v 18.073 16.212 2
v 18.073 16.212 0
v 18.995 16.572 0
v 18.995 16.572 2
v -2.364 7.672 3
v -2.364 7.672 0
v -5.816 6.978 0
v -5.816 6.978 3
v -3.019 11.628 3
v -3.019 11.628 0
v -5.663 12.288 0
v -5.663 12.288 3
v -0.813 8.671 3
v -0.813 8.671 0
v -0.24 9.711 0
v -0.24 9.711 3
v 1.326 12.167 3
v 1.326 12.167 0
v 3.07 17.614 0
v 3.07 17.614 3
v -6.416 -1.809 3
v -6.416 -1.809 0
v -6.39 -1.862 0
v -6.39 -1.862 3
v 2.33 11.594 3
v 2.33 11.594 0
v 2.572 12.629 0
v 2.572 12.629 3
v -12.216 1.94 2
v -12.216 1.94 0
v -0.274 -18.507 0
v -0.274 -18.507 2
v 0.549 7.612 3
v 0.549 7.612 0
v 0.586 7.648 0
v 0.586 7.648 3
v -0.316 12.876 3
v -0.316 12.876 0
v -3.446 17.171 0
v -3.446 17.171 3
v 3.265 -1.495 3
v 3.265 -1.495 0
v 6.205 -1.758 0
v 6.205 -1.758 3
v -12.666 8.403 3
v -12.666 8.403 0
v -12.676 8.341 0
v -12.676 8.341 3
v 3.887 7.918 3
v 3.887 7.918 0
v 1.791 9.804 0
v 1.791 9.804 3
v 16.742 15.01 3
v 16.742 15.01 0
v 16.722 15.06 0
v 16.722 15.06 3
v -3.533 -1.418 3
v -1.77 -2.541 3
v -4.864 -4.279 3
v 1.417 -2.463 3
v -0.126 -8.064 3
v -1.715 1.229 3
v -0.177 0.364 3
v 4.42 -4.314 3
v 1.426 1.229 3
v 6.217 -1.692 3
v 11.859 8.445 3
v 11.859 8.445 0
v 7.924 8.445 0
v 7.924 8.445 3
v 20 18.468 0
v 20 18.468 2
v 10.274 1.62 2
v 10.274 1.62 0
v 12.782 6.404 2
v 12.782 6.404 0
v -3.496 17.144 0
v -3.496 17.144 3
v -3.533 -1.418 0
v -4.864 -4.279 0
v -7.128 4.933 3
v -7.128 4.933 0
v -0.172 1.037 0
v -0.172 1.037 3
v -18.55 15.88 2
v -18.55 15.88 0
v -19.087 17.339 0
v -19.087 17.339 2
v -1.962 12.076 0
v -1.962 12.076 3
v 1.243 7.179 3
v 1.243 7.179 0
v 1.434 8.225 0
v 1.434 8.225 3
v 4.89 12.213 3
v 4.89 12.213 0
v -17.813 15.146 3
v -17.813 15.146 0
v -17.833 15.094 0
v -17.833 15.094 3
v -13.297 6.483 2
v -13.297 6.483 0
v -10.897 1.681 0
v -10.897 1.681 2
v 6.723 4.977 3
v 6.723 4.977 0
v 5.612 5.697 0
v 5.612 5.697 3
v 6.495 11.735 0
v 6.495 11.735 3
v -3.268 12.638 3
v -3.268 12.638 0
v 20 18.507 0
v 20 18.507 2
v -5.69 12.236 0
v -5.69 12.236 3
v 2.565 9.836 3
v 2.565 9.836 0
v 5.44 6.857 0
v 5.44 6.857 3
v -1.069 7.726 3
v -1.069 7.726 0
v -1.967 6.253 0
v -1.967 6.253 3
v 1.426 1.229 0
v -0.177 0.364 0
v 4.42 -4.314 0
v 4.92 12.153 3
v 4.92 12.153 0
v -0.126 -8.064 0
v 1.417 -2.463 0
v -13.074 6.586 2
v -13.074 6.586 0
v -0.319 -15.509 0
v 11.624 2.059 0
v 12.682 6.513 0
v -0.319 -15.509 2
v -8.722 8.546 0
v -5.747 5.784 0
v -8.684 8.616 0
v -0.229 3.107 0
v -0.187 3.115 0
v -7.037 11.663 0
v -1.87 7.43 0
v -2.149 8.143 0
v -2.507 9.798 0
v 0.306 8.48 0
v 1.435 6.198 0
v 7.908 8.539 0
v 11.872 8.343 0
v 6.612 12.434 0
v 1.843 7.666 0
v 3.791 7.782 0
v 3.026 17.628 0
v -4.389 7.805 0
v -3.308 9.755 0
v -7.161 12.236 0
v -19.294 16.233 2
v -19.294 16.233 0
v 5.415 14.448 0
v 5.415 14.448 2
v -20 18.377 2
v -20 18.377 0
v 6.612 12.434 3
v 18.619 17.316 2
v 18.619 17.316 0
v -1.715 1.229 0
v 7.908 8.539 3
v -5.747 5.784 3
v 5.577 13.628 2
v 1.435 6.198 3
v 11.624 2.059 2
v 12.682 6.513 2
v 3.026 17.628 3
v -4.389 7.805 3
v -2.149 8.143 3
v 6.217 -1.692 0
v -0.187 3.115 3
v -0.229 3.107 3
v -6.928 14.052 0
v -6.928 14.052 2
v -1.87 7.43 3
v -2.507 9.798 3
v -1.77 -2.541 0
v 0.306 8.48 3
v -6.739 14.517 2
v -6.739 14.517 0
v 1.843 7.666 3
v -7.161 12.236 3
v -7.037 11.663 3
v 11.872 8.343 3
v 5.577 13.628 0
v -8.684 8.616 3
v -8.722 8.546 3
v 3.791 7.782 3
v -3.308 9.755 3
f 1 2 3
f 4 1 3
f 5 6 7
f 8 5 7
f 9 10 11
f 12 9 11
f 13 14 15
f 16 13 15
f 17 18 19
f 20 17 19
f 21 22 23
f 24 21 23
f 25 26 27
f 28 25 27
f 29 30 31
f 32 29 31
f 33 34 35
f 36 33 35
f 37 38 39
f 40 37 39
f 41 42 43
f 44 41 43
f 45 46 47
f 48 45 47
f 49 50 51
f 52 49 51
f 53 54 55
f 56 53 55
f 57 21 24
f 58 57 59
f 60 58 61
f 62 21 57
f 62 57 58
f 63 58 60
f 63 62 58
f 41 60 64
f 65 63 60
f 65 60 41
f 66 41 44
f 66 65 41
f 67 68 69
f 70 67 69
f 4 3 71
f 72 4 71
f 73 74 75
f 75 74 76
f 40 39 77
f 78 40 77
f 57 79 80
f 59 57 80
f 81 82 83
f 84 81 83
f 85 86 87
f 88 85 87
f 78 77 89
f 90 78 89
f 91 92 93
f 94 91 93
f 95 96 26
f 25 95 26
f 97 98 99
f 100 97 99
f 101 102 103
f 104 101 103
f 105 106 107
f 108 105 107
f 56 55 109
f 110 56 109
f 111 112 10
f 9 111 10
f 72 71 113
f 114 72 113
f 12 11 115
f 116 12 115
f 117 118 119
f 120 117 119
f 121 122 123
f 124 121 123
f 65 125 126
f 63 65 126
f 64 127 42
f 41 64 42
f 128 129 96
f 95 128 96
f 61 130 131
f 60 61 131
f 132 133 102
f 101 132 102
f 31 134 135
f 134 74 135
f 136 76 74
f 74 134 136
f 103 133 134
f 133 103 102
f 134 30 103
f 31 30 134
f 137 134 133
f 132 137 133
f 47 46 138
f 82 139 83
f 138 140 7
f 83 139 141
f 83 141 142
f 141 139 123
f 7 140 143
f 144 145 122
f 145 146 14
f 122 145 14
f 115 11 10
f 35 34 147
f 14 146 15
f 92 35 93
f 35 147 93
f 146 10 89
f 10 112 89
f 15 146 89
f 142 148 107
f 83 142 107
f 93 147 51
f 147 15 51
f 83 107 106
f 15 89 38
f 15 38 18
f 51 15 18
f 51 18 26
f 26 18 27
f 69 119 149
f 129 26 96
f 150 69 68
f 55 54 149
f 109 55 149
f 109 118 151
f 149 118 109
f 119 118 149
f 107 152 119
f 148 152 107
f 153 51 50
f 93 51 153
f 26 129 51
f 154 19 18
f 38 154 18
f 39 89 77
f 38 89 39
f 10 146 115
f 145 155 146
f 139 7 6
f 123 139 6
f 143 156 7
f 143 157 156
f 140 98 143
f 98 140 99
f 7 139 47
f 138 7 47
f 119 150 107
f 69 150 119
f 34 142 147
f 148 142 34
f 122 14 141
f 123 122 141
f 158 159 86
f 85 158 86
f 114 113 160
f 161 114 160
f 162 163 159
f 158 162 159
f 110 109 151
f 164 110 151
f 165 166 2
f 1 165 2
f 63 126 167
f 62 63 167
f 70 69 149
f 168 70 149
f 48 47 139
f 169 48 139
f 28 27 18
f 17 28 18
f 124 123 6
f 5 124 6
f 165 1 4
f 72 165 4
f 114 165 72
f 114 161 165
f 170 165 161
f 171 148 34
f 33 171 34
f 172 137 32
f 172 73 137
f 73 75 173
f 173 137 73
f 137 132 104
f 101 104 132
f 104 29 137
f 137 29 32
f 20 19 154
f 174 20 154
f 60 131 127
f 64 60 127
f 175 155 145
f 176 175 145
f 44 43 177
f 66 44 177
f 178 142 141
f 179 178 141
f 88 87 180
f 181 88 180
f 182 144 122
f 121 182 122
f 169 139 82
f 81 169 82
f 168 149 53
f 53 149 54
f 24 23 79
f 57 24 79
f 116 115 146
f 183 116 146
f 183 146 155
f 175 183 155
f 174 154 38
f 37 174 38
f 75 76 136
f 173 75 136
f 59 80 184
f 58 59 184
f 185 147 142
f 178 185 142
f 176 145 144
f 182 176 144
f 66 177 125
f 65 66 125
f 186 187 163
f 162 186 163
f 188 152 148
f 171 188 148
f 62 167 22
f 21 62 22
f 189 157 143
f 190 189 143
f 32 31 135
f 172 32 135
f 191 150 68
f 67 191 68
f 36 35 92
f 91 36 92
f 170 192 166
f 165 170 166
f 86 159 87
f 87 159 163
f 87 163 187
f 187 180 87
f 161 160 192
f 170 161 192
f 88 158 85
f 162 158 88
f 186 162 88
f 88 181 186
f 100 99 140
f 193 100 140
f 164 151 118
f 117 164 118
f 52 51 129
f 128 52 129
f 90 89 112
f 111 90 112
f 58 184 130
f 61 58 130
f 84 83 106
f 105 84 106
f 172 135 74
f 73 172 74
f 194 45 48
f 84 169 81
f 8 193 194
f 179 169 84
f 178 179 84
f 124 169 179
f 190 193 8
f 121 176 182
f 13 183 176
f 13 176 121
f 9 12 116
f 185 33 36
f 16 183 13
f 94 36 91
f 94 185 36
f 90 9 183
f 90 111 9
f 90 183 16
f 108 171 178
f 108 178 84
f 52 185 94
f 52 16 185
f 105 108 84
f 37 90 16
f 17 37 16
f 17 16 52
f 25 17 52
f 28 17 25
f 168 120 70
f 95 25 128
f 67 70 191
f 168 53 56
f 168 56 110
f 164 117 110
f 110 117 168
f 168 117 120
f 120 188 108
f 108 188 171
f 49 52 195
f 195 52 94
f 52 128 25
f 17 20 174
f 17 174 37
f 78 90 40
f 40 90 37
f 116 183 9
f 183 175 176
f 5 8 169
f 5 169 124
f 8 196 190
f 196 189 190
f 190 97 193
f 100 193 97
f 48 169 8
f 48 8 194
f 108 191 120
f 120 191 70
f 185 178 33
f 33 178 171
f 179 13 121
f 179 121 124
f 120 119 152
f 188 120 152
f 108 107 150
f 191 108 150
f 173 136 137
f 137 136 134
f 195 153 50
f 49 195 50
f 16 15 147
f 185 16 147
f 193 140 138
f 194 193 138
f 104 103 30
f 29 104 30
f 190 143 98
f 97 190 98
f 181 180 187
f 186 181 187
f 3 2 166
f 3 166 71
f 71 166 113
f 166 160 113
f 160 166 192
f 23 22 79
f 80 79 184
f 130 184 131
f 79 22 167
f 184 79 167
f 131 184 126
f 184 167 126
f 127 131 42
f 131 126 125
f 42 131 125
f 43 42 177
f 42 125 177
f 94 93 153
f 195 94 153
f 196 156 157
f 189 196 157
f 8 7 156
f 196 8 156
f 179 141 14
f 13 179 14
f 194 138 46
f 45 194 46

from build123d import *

# Parameters (mm, degrees)
F1_DEPTH = 3
F2_DEPTH = 2


with BuildPart() as f1:
    # F0 (on Top) → F1 (new body)
    with BuildSketch(Plane.XY):
        Polygon((7.907842, 8.538687), (16.74215, 15.010359), (16.721842, 15.059722), (6.494656, 11.734686), (6.611635, 12.434355), (2.565389, 9.835677), (5.439689, 6.85723), (1.842724, 7.665902), (1.434655, 6.197749), (0.549113, 7.611849), (0.586172, 7.647995), (1.242522, 7.178572), (1.434276, 8.224858), (3.791214, 7.782166), (3.887142, 7.918195), (1.790835, 9.804296), (4.920111, 12.153183), (4.889556, 12.213288), (2.330171, 11.593876), (2.572244, 12.628565), (1.326409, 12.166996), (3.07041, 17.613794), (3.025963, 17.628013), (-0.315749, 12.875707), (-3.445606, 17.171227), (-3.495616, 17.144395), (-1.961859, 12.075858), (-3.267673, 12.638358), (-3.019098, 11.627581), (-5.66303, 12.288217), (-5.690025, 12.235915), (-2.506646, 9.797755), (-4.388916, 7.805242), (-2.148981, 8.142507), (-1.86975, 7.429696), (-1.068826, 7.726003), (-1.966873, 6.253454), (-2.363597, 7.671869), (-5.815879, 6.978105), (-3.307755, 9.755126), (-7.16087, 12.236394), (-7.036772, 11.662706), (-17.813078, 15.145552), (-17.832896, 15.093641), (-8.684373, 8.616295), (-8.72197, 8.545996), (-12.66624, 8.40341), (-12.67619, 8.341238), (-5.746909, 5.784377), (-7.127951, 4.932837), (-0.171673, 1.036983), (6.722542, 4.976714), (5.612193, 5.69696), (11.871901, 8.342868), (11.858882, 8.444866), (7.924471, 8.444866), align=None)
        Polygon((-0.186629, 3.115098), (-0.22882, 3.107443), (-0.813041, 8.671457), (-0.240196, 9.711248), (0.306376, 8.479956), align=None, mode=Mode.SUBTRACT)
        Polygon((-4.864236, -4.278623), (-1.769502, -2.540595), (-0.12638, -8.064224), (1.417114, -2.463104), (4.419826, -4.313662), (3.264686, -1.494774), (6.204638, -1.757816), (6.21701, -1.692158), (1.426404, 1.228785), (-0.177398, 0.363535), (-1.714927, 1.228641), (-6.416431, -1.808915), (-6.390156, -1.861733), (-3.533088, -1.418473), align=None)
    extrude(amount=F1_DEPTH)


with BuildPart() as f2:
    # F0 (on Top) → F2 (new body)
    with BuildSketch(Plane.XY):
        Polygon((-6.927818, 14.052455), (-6.738956, 14.5167), (-20, 18.377043), (-19.294454, 16.233188), (-18.549654, 15.87955), (-19.086751, 17.339325), align=None)
        Polygon((18.994696, 16.571661), (20, 18.468198), (20, 18.507293), (5.414689, 14.447889), (5.576963, 13.628273), (18.618895, 17.316469), (18.072654, 16.211578), align=None)
        Polygon((10.274296, 1.619571), (12.782395, 6.403919), (12.681952, 6.512888), (-0.31924, -15.509024), (-13.074054, 6.586273), (-13.296511, 6.482892), (-10.897361, 1.681245), (-12.216222, 1.939678), (-0.274179, -18.507293), (11.62413, 2.059077), align=None)
    extrude(amount=F2_DEPTH)


solid = Compound([f1.part, f2.part])
